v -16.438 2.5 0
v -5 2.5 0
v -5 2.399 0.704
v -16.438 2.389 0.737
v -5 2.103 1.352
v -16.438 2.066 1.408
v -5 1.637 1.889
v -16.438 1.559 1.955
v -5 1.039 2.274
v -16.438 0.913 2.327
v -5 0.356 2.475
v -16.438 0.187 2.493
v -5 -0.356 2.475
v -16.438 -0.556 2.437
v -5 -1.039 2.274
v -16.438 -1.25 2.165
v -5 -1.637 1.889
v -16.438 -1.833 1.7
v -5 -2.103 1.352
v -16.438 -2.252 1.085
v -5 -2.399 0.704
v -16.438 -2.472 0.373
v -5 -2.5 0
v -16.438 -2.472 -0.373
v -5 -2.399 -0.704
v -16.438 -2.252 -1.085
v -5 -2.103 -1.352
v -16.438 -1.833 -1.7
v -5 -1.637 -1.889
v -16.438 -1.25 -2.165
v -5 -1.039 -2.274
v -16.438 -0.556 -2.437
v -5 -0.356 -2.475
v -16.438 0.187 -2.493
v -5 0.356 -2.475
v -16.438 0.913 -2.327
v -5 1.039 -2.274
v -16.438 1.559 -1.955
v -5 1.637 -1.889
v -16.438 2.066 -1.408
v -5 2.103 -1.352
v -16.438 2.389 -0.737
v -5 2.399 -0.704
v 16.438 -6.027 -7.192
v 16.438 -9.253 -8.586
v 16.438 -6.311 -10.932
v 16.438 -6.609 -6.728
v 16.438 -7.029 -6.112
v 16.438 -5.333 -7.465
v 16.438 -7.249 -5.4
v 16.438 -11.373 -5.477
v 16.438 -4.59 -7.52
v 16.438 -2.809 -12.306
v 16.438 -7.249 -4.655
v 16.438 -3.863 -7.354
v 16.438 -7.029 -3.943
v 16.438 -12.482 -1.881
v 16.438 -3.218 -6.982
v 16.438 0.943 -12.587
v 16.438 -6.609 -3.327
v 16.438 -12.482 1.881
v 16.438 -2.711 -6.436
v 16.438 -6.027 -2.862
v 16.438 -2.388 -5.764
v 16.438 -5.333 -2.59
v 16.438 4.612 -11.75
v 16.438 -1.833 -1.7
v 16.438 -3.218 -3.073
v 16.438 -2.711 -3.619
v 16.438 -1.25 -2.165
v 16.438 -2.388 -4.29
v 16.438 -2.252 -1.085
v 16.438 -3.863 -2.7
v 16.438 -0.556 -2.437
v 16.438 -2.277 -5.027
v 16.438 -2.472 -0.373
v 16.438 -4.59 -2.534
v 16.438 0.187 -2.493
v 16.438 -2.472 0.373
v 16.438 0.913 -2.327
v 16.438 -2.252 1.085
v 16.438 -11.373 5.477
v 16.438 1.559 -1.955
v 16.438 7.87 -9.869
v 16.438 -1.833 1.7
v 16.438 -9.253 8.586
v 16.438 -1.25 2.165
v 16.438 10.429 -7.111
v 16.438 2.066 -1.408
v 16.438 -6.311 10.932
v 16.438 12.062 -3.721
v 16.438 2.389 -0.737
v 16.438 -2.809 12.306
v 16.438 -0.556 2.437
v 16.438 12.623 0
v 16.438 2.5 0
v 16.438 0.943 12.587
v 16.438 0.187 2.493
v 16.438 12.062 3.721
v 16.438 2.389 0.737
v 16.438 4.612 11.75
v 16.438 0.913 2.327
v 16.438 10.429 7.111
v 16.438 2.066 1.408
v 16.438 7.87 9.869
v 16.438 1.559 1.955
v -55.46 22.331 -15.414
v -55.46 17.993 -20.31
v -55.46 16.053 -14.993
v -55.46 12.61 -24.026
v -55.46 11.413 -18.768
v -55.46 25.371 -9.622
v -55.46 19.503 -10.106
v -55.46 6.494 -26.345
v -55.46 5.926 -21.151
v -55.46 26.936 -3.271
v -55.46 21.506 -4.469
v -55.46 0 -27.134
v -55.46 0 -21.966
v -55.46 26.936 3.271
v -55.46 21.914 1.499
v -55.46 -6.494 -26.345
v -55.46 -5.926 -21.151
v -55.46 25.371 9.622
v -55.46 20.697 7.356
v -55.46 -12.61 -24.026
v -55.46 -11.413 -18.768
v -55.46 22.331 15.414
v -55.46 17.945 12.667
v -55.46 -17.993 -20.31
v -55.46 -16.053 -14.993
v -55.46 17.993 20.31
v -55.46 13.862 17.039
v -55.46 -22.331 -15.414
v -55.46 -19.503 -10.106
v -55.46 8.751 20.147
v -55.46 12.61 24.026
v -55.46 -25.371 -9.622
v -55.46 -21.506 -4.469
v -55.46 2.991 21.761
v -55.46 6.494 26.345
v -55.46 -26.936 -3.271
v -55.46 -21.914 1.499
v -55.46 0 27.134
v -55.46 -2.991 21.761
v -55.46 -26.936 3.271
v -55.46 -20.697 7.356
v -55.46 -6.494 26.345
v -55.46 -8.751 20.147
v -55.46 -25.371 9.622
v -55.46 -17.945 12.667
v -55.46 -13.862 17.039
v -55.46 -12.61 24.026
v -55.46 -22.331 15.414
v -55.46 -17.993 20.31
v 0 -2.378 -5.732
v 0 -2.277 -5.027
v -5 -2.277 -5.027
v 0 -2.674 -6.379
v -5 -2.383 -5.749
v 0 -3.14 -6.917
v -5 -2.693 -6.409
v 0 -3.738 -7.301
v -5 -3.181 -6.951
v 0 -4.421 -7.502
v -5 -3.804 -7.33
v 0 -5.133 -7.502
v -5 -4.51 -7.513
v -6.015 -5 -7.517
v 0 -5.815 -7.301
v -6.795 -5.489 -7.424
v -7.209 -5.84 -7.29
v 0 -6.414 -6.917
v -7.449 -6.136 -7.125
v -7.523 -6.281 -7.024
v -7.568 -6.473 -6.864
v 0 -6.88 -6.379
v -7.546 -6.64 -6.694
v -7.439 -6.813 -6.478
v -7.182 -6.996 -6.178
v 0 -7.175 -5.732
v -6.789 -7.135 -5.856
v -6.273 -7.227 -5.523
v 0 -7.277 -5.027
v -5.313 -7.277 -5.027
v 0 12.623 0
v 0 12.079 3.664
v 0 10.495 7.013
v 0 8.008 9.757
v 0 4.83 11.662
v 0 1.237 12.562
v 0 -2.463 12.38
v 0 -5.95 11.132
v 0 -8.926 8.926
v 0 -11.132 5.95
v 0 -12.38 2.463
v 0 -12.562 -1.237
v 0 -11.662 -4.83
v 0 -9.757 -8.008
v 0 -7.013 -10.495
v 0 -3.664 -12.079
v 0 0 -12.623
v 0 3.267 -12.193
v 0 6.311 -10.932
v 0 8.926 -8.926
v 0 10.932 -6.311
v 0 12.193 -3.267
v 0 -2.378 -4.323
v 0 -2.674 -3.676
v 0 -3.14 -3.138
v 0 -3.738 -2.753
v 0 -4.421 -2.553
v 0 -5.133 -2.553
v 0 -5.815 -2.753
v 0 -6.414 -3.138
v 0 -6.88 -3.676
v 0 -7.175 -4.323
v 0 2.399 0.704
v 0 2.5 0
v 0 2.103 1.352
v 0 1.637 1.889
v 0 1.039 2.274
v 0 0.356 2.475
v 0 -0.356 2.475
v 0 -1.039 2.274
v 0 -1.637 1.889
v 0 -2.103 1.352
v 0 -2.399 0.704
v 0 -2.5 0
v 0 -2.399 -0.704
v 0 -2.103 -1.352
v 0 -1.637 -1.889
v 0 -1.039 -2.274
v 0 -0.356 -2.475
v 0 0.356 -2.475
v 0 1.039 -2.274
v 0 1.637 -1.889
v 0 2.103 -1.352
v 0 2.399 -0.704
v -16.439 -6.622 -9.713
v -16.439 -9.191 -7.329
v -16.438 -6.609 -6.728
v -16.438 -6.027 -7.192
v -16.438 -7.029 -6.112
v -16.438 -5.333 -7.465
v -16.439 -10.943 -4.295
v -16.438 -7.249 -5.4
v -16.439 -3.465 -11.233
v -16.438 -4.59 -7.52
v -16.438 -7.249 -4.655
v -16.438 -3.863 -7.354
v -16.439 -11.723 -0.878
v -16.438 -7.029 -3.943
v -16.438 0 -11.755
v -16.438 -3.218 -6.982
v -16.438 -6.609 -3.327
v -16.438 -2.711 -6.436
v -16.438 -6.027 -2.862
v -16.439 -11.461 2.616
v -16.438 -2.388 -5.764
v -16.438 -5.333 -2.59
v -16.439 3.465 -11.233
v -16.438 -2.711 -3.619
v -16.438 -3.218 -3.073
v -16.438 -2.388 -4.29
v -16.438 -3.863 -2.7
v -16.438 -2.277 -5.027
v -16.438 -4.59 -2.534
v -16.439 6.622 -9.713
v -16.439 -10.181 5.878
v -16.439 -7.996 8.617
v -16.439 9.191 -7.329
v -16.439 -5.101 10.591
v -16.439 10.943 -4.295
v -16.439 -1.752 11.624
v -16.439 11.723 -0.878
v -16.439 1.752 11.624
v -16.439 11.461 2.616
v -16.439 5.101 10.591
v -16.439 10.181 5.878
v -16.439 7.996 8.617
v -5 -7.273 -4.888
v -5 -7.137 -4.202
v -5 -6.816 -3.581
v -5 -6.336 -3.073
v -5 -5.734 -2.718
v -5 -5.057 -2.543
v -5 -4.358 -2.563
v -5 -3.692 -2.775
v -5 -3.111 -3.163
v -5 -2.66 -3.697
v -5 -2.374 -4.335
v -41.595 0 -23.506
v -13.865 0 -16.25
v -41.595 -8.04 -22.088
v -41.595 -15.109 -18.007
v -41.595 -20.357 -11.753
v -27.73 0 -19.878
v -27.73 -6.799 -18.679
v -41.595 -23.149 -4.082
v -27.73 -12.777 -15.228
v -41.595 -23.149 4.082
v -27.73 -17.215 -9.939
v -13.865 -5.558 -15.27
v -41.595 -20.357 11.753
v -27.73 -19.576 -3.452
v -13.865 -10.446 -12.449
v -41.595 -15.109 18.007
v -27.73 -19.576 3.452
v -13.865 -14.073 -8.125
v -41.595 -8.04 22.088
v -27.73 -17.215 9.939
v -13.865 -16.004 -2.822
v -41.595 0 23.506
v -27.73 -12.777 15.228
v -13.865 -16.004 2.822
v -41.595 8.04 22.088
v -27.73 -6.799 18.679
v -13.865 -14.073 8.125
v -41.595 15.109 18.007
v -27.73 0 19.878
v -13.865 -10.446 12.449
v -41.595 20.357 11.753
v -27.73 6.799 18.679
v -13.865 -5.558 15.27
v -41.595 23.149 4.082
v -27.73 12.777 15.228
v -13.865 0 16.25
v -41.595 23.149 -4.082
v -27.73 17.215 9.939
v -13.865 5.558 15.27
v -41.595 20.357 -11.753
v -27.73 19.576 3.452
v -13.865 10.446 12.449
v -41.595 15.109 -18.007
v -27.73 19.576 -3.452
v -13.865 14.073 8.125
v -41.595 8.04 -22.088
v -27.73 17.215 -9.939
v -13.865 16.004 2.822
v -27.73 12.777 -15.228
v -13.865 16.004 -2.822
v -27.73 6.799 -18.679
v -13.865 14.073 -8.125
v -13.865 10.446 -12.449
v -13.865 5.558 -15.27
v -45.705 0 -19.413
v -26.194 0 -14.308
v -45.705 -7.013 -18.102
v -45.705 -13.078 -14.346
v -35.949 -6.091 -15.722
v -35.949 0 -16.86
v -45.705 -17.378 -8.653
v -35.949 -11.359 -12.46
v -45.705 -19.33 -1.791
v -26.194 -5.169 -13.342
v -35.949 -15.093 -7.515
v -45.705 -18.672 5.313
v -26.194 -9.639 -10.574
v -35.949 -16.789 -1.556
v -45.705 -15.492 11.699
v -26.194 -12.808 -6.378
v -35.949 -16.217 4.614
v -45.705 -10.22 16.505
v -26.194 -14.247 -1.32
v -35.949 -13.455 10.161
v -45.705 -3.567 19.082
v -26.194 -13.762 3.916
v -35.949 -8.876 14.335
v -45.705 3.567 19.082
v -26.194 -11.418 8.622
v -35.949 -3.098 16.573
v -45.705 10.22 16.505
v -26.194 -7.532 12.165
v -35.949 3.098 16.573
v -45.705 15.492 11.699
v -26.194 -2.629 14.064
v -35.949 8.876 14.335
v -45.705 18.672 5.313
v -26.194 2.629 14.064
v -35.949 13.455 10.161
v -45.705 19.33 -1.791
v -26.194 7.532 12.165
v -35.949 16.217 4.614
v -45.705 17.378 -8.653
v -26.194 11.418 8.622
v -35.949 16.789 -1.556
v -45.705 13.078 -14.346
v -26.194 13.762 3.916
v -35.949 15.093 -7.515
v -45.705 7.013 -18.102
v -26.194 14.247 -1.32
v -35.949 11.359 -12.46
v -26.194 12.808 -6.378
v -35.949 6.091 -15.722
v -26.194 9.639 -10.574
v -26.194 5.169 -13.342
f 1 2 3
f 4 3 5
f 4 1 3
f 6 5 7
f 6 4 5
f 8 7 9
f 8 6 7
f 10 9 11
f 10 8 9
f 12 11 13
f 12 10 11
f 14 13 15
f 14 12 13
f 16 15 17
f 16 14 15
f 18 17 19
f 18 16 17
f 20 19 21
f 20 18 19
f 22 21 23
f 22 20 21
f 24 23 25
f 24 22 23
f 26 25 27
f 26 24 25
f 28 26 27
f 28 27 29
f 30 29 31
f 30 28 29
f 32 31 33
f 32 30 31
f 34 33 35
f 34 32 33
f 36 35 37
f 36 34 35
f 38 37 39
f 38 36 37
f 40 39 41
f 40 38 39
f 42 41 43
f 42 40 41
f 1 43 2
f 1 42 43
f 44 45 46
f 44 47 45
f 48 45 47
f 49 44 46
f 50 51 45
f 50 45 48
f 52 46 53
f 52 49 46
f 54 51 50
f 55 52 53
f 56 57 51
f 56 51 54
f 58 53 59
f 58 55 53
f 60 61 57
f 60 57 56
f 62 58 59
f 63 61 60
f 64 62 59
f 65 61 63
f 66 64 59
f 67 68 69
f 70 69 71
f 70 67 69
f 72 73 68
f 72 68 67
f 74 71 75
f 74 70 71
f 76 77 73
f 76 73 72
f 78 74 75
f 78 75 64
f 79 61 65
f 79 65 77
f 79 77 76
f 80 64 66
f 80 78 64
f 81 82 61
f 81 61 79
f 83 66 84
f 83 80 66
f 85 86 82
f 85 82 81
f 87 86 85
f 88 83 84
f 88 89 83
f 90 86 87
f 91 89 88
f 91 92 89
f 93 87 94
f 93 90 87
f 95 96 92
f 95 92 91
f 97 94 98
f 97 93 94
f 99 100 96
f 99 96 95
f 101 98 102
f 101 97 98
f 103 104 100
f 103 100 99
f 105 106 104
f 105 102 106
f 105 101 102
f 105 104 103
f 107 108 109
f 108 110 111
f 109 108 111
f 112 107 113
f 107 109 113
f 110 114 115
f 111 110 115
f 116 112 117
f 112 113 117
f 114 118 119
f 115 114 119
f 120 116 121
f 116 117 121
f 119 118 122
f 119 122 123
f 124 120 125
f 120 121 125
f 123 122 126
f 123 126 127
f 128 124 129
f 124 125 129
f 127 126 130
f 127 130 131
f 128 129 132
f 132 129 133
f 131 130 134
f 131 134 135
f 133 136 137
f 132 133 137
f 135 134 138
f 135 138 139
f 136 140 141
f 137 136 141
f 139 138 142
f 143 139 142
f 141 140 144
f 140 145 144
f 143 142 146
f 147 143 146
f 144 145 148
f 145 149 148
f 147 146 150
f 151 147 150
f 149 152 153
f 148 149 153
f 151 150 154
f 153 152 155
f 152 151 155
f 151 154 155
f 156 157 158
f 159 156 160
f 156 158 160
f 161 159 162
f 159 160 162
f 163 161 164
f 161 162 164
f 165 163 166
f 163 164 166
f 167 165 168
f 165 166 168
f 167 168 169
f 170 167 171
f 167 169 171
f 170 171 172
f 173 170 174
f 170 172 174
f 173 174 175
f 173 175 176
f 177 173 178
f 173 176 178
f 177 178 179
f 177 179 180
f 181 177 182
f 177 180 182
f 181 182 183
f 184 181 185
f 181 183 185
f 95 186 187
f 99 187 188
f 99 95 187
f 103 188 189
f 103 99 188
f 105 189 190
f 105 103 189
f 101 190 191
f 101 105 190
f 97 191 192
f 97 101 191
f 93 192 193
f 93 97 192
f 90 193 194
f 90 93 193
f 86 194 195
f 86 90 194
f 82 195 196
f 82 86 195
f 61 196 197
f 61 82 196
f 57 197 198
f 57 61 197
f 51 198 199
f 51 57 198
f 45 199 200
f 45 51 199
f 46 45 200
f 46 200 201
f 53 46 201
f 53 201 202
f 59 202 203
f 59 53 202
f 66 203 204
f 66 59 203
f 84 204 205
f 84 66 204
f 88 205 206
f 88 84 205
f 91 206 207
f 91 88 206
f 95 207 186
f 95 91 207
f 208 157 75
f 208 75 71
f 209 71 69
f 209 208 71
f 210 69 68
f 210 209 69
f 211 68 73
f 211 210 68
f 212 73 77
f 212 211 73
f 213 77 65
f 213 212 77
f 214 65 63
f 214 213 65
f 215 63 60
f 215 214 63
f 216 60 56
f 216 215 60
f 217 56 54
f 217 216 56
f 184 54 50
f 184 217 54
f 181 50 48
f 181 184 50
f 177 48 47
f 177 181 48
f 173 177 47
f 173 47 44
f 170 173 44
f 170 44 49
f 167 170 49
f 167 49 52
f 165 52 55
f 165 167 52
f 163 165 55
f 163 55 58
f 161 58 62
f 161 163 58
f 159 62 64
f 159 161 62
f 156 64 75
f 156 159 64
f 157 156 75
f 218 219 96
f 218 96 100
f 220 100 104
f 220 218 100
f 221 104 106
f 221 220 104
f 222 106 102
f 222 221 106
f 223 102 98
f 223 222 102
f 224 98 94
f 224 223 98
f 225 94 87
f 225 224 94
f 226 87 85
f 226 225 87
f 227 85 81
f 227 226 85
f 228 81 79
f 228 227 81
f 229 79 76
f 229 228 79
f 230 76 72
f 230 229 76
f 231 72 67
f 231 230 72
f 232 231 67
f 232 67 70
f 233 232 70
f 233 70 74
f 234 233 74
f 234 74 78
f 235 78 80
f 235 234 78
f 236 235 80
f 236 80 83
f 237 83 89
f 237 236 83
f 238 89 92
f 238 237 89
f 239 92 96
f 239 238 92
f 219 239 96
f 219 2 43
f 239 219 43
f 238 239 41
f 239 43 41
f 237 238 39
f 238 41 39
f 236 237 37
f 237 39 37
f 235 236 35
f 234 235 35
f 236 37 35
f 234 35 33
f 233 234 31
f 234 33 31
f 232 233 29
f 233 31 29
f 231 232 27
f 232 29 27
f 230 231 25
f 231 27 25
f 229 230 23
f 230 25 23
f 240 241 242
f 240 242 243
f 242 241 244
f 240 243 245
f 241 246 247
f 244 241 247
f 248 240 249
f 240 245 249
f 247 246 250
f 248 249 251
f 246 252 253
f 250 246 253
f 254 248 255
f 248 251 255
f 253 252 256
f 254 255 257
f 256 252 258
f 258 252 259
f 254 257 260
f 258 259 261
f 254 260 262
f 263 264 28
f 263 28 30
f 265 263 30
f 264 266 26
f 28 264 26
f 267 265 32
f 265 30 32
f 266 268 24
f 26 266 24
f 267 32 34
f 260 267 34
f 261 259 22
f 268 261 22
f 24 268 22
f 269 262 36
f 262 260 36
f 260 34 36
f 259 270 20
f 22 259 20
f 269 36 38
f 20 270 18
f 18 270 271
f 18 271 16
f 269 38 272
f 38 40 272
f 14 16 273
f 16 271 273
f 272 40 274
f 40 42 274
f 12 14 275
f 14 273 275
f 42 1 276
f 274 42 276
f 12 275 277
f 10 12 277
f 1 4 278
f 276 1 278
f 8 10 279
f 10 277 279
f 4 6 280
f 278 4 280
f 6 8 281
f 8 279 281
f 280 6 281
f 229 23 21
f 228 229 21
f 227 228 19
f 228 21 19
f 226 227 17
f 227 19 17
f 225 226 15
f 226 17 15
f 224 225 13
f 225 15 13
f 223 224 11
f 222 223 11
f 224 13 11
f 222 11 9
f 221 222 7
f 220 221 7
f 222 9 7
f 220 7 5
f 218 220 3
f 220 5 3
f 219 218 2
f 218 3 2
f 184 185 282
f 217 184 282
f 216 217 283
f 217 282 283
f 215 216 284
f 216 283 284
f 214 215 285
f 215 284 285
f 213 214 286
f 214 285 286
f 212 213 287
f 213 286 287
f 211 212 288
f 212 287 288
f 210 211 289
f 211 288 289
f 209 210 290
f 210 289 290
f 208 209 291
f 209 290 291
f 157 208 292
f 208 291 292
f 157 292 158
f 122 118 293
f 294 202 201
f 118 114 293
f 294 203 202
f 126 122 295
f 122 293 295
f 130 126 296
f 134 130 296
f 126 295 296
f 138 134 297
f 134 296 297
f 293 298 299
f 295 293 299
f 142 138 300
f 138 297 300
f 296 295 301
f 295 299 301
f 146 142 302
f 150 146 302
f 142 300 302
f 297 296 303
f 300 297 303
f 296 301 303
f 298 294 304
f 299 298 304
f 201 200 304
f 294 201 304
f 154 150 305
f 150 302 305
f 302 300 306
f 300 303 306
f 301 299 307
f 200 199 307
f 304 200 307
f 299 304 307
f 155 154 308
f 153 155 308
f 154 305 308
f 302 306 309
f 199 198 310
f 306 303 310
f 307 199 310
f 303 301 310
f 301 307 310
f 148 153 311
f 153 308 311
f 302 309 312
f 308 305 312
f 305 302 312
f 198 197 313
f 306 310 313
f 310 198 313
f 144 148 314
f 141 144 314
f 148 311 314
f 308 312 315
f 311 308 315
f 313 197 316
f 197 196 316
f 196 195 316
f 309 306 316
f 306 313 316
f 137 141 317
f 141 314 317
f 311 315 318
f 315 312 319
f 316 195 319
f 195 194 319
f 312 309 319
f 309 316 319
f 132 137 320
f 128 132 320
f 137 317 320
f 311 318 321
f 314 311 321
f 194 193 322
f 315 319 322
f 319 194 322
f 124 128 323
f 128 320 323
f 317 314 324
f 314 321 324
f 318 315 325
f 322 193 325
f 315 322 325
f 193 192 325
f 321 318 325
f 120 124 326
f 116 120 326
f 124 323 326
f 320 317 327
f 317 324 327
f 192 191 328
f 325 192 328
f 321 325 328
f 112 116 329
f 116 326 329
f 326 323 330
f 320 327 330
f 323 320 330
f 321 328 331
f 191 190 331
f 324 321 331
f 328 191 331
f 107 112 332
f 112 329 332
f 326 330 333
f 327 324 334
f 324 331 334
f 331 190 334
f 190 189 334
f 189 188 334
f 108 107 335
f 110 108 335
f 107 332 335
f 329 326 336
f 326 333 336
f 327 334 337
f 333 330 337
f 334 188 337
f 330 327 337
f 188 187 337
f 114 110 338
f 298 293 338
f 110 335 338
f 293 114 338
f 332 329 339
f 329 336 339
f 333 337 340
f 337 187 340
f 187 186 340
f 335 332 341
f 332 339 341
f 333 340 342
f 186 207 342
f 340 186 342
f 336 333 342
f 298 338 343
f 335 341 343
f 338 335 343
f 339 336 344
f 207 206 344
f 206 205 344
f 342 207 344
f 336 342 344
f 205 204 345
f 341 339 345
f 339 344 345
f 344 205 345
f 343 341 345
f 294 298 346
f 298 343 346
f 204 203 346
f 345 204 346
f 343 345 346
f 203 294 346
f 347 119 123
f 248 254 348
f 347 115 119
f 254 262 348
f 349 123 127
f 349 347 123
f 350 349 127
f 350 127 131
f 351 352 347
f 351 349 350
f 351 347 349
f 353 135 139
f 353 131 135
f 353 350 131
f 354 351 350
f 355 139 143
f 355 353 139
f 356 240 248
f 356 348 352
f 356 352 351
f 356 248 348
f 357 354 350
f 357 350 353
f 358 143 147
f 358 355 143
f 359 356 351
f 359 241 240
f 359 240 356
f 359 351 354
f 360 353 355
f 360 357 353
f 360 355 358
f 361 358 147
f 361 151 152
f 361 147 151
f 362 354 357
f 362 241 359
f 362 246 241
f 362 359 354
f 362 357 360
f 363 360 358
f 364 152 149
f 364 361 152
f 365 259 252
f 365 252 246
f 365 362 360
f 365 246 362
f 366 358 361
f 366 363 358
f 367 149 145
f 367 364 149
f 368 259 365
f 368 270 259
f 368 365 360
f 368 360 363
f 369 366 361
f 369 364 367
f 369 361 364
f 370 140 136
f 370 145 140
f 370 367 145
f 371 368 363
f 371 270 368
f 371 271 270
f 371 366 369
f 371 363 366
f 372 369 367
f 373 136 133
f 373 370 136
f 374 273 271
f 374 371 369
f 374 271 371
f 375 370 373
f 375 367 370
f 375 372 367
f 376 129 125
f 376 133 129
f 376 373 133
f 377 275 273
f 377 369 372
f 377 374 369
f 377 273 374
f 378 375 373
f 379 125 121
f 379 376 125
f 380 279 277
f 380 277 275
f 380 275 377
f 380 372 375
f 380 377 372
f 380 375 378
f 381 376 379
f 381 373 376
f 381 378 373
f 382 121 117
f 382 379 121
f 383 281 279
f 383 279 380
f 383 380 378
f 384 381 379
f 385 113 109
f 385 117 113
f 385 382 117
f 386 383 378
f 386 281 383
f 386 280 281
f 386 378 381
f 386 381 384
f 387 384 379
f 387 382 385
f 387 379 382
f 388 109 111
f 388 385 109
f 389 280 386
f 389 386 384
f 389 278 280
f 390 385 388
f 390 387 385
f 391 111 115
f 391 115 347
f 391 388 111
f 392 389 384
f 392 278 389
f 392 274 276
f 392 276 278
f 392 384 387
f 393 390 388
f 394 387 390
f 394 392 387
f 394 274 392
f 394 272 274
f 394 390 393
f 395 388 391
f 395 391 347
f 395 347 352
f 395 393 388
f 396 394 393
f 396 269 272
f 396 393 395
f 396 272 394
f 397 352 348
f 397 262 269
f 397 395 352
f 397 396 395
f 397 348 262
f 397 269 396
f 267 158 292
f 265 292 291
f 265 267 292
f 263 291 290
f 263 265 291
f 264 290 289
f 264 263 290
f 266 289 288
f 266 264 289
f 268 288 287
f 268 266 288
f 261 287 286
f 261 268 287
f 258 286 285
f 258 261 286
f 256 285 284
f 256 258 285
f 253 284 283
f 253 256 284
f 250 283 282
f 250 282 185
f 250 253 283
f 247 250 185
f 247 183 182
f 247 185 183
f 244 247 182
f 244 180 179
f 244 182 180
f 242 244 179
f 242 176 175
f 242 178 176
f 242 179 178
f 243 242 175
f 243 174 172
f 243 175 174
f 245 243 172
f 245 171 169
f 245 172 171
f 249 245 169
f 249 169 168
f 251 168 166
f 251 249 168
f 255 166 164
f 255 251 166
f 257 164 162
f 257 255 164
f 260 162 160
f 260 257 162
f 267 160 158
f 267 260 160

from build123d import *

# Parameters (mm, degrees)
F2_T        = -5
F4_D        = 5
F1_FACE_R   = 12.622695
F1_FACE_R_2 = 2.5
F5_DEPTH    = 16.4385


with BuildPart() as f1:
    # F0 (on Front) → F1 (revolve)
    with BuildSketch(Plane.XZ):
        Polygon((-55.460349, -27.133826), (0, -12.622695), (0, 0), (-55.460349, 0), align=None)
    revolve(axis=Axis((7.454347, 0, 0), (-1, 0, 0)))

    # F2
    f2_openings = [f1.faces().sort_by_distance(p)[0] for p in [
        (-55.460349, 0, 0),
    ]]
    offset(amount=F2_T, openings=f2_openings)

    # F4 (through all)
    with Locations(Plane.YZ):
        with Locations((0, 0), (-4.776739, -5.027231)):
            Hole(F4_D / 2)

    # F1_face (on face) → F5 (join, symmetric)
    with BuildSketch(Plane.YZ):
        Circle(F1_FACE_R)
        Circle(F1_FACE_R_2, mode=Mode.SUBTRACT)
        with Locations((-4.776739, -5.027231)):
            Circle(F1_FACE_R_2, mode=Mode.SUBTRACT)
    extrude(amount=F5_DEPTH, both=True)


solid = f1.part
